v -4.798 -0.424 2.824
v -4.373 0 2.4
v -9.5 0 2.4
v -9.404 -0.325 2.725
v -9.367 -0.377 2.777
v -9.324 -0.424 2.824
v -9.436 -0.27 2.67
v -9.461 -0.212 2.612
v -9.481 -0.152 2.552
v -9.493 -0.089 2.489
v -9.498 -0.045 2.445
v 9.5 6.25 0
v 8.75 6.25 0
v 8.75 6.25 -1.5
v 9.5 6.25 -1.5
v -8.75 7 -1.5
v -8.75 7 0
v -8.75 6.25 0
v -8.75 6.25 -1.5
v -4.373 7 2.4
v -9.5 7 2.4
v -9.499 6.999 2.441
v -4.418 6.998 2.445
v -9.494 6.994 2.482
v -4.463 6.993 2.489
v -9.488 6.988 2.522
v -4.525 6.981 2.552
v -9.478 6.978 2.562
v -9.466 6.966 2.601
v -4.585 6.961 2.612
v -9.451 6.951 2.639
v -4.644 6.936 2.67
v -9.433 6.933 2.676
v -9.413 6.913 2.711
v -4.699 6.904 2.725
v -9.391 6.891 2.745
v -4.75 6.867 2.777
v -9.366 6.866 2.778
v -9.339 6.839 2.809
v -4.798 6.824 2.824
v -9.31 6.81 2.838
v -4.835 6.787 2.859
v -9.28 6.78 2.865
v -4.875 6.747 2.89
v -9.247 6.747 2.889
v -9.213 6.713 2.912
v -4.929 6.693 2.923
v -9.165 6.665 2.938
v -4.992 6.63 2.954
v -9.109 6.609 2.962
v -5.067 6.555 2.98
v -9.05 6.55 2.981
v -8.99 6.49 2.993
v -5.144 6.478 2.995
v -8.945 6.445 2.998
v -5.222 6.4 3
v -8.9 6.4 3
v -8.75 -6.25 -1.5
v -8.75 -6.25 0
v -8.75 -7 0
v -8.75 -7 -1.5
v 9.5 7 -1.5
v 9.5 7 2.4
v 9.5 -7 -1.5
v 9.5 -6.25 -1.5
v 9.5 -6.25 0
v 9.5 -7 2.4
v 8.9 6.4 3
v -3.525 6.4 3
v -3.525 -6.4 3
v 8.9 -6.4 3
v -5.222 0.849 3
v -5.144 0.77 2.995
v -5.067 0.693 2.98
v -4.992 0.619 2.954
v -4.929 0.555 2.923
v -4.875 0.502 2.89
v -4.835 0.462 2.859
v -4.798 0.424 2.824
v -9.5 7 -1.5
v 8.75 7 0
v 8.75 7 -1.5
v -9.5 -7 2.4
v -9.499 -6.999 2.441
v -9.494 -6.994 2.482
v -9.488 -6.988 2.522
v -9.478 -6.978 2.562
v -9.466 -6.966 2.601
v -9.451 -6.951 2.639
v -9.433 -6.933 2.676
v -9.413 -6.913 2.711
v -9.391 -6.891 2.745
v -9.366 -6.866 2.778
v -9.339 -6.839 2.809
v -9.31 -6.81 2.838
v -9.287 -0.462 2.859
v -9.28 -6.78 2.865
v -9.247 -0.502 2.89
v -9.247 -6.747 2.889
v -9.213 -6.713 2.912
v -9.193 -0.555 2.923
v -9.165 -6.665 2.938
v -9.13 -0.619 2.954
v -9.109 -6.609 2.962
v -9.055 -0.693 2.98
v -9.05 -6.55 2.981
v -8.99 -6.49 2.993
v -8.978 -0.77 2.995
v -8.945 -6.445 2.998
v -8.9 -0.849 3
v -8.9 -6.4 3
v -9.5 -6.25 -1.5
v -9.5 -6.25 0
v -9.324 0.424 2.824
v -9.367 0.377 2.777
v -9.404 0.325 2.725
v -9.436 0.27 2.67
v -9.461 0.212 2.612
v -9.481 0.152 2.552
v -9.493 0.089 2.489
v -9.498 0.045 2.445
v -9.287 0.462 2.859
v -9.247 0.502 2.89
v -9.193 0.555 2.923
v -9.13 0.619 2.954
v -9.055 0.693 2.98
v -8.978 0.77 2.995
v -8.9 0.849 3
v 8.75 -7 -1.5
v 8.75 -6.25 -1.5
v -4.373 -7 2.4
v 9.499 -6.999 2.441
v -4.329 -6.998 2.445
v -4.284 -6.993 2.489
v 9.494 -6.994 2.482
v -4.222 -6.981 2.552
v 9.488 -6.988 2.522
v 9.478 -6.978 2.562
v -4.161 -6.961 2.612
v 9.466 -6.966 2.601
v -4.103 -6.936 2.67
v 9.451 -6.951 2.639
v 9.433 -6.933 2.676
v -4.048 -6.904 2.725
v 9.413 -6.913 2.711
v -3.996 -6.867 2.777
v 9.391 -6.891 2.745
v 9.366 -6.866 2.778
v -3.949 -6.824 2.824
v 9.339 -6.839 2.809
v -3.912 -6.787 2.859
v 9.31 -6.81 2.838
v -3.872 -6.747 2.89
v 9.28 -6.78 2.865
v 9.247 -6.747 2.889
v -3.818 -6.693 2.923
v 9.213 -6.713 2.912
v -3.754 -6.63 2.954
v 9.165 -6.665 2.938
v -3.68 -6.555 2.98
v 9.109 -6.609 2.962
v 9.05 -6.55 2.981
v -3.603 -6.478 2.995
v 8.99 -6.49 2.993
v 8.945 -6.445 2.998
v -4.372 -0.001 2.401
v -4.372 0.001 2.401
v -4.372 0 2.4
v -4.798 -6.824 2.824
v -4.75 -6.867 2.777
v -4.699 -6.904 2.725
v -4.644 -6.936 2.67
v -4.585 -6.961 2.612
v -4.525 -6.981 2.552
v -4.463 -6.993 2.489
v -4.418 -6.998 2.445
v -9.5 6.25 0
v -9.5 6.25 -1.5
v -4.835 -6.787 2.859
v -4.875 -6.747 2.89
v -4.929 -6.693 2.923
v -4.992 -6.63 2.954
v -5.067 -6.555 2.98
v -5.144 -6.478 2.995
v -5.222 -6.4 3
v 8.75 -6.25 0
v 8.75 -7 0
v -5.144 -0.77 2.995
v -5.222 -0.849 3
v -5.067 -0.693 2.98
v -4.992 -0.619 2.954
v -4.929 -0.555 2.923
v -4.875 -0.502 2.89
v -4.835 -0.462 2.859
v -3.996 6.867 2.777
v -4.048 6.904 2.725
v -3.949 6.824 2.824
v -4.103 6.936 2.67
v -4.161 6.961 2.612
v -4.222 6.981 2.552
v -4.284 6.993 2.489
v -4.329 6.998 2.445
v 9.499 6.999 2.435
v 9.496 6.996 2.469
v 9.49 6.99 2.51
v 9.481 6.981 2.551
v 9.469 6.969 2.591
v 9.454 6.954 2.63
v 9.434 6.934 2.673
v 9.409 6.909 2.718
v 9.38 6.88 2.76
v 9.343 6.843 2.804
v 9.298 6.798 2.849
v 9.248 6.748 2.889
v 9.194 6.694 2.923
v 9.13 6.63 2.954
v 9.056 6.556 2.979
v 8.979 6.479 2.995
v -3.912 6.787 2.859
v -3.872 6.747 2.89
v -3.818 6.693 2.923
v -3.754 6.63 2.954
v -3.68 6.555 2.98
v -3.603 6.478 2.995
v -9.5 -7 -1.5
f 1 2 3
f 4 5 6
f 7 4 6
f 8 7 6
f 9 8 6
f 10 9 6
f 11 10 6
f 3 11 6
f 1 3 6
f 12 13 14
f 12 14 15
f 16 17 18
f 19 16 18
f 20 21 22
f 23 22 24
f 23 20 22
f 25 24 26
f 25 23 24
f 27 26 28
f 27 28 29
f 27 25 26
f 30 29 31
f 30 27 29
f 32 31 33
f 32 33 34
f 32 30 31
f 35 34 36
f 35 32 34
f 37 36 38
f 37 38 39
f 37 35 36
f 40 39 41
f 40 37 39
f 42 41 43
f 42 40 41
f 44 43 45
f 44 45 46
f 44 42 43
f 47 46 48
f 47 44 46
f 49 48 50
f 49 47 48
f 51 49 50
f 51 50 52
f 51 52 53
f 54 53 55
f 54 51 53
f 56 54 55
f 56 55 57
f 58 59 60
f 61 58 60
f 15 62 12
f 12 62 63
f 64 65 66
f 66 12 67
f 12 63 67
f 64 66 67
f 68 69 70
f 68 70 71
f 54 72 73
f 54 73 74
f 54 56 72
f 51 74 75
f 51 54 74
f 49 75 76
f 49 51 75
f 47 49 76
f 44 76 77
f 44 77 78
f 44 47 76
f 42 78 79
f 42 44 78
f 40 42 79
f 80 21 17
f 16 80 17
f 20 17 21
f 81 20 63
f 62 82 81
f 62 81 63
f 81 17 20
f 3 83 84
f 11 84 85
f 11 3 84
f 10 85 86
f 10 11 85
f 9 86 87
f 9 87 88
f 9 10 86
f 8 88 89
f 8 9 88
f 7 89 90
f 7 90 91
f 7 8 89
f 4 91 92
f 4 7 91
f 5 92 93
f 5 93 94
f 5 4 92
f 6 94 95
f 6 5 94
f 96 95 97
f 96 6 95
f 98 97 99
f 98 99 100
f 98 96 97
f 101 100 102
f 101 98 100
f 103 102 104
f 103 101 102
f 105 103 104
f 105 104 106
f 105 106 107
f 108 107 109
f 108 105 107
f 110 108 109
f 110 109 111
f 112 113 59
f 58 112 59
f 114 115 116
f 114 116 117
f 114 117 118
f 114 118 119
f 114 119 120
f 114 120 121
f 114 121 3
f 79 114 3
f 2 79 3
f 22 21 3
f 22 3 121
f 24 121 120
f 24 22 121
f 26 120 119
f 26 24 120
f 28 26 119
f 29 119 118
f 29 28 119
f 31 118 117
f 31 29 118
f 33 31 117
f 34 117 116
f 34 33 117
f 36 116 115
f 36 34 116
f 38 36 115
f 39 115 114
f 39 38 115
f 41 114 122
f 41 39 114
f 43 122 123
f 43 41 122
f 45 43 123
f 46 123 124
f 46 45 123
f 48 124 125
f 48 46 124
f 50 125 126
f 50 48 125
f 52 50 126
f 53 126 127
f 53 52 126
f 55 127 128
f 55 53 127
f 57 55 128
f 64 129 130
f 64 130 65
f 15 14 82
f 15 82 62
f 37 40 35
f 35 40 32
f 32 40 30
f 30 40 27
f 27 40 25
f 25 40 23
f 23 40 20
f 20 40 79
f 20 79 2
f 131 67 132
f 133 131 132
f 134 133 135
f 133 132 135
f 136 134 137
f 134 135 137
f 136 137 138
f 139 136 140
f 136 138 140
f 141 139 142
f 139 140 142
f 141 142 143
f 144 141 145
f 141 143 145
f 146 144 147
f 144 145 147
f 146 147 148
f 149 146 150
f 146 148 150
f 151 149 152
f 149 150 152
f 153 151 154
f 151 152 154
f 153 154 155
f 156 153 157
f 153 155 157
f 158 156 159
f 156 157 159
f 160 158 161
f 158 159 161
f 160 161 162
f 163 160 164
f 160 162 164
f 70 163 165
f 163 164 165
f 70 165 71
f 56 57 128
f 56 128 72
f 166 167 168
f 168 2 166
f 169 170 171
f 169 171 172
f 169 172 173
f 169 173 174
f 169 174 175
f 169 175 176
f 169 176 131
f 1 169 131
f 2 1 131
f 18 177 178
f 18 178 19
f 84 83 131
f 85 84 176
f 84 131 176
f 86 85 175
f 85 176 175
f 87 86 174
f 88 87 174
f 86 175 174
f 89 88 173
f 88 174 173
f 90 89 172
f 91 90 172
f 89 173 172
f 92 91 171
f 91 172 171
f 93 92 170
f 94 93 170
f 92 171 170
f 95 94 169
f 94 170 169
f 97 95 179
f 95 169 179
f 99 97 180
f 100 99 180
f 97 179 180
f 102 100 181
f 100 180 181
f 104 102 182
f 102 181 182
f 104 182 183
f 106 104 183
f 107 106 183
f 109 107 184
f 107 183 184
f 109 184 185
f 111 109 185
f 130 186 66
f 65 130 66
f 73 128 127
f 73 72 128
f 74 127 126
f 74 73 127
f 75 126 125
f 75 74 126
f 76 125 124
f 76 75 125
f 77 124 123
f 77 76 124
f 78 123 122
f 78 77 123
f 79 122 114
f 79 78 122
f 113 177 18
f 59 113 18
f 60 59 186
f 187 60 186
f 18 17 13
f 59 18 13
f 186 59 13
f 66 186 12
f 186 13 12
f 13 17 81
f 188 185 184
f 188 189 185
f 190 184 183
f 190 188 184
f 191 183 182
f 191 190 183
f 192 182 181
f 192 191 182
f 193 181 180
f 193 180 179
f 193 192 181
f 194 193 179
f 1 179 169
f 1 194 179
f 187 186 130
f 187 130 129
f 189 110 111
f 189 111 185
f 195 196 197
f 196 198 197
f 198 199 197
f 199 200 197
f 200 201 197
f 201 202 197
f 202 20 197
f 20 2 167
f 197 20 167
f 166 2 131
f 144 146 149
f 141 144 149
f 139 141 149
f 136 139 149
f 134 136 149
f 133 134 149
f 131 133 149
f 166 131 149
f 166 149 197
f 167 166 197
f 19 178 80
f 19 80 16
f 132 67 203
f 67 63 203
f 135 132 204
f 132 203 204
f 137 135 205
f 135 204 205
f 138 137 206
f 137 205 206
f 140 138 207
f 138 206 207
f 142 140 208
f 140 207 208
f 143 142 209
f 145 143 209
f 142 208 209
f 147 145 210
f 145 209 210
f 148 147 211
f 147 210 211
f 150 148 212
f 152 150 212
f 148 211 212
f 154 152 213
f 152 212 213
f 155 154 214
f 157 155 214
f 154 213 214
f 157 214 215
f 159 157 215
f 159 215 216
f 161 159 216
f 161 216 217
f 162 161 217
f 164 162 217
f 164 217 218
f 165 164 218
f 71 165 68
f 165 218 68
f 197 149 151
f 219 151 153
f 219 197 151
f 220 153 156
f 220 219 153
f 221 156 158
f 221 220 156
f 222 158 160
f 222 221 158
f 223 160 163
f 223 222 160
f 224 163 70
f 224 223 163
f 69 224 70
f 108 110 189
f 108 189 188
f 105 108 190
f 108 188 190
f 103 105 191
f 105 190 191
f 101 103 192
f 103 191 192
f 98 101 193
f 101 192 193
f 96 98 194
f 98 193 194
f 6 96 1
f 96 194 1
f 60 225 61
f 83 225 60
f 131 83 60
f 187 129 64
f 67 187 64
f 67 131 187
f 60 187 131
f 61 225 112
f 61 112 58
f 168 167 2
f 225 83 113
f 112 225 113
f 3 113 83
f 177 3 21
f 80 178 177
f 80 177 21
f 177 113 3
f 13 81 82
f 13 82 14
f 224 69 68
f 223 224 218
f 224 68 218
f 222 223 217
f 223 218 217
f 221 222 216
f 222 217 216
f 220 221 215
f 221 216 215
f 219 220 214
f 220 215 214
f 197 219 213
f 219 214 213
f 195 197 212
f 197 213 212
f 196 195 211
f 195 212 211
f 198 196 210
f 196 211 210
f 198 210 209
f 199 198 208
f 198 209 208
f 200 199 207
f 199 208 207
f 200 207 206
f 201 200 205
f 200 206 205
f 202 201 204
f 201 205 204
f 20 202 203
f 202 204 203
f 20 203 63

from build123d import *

# Parameters (mm, degrees)
F0_W     = 19
F0_H     = 14
F1_DEPTH = 3
F2_W     = 0.75
F2_H     = 0.75
F3_DEPTH = 1.5
F5_DEPTH = 14.001
F7_DEPTH = 5.127709538
F8_R     = 0.59999


# Not quite as in the source:
# - a fillet or chamfer is up to 0.001 mm smaller than in the source, because OpenCascade refuses the exact size


with BuildPart() as f1:
    # F0 (on Top) → F1 (new body)
    with BuildSketch(Plane.XY):
        Rectangle(F0_W, F0_H)
    extrude(amount=F1_DEPTH)

    # F2 (on face) → F3 (join)
    with BuildSketch(Plane(origin=(0, 0, 0), x_dir=(1, 0, 0), z_dir=(0, 0, -1))):
        with Locations((9.125, 6.625)):
            Rectangle(F2_W, F2_H)
        with Locations((-9.125, 6.625)):
            Rectangle(F2_W, F2_H)
        with Locations((-9.125, -6.625)):
            Rectangle(F2_W, F2_H)
        with Locations((9.125, -6.625)):
            Rectangle(F2_W, F2_H)
    extrude(amount=F3_DEPTH)

    # F4 (on face) → F5 (cut, through all)
    with BuildSketch(Plane.XZ.offset(7)):
        Polygon((-3.773290462, 3), (-4.973290462, 3), (-4.373290462, 2.4), align=None)
    extrude(amount=-F5_DEPTH, mode=Mode.SUBTRACT)

    # F6 (on face) → F7 (cut, through all)
    with BuildSketch(Plane(origin=(-9.5, 0, 0), x_dir=(0, -1, 0), z_dir=(-1, 0, 0))):
        Polygon((0.6, 3), (-0.6, 3), (0, 2.4), align=None)
    extrude(amount=-F7_DEPTH, mode=Mode.SUBTRACT)

    # F8 (radius 0.6 in the source; OpenCascade refuses exactly that, so slightly less here)
    f8_edges = [f1.edges().sort_by_distance(p)[0] for p in [
        (-3.77329, 0, 3),
        (-4.97329, 3.8, 3),
        (-4.97329, -3.8, 3),
        (-7.236645, -0.6, 3),
        (-7.236645, 0.6, 3),
        (2.863355, -7, 3),
        (-7.236645, -7, 3),
        (2.863355, 7, 3),
        (9.5, 0, 3),
        (-7.236645, 7, 3),
        (-9.5, 3.8, 3),
        (-9.5, -3.8, 3),
    ]]
    fillet(f8_edges, radius=F8_R)


solid = f1.part
